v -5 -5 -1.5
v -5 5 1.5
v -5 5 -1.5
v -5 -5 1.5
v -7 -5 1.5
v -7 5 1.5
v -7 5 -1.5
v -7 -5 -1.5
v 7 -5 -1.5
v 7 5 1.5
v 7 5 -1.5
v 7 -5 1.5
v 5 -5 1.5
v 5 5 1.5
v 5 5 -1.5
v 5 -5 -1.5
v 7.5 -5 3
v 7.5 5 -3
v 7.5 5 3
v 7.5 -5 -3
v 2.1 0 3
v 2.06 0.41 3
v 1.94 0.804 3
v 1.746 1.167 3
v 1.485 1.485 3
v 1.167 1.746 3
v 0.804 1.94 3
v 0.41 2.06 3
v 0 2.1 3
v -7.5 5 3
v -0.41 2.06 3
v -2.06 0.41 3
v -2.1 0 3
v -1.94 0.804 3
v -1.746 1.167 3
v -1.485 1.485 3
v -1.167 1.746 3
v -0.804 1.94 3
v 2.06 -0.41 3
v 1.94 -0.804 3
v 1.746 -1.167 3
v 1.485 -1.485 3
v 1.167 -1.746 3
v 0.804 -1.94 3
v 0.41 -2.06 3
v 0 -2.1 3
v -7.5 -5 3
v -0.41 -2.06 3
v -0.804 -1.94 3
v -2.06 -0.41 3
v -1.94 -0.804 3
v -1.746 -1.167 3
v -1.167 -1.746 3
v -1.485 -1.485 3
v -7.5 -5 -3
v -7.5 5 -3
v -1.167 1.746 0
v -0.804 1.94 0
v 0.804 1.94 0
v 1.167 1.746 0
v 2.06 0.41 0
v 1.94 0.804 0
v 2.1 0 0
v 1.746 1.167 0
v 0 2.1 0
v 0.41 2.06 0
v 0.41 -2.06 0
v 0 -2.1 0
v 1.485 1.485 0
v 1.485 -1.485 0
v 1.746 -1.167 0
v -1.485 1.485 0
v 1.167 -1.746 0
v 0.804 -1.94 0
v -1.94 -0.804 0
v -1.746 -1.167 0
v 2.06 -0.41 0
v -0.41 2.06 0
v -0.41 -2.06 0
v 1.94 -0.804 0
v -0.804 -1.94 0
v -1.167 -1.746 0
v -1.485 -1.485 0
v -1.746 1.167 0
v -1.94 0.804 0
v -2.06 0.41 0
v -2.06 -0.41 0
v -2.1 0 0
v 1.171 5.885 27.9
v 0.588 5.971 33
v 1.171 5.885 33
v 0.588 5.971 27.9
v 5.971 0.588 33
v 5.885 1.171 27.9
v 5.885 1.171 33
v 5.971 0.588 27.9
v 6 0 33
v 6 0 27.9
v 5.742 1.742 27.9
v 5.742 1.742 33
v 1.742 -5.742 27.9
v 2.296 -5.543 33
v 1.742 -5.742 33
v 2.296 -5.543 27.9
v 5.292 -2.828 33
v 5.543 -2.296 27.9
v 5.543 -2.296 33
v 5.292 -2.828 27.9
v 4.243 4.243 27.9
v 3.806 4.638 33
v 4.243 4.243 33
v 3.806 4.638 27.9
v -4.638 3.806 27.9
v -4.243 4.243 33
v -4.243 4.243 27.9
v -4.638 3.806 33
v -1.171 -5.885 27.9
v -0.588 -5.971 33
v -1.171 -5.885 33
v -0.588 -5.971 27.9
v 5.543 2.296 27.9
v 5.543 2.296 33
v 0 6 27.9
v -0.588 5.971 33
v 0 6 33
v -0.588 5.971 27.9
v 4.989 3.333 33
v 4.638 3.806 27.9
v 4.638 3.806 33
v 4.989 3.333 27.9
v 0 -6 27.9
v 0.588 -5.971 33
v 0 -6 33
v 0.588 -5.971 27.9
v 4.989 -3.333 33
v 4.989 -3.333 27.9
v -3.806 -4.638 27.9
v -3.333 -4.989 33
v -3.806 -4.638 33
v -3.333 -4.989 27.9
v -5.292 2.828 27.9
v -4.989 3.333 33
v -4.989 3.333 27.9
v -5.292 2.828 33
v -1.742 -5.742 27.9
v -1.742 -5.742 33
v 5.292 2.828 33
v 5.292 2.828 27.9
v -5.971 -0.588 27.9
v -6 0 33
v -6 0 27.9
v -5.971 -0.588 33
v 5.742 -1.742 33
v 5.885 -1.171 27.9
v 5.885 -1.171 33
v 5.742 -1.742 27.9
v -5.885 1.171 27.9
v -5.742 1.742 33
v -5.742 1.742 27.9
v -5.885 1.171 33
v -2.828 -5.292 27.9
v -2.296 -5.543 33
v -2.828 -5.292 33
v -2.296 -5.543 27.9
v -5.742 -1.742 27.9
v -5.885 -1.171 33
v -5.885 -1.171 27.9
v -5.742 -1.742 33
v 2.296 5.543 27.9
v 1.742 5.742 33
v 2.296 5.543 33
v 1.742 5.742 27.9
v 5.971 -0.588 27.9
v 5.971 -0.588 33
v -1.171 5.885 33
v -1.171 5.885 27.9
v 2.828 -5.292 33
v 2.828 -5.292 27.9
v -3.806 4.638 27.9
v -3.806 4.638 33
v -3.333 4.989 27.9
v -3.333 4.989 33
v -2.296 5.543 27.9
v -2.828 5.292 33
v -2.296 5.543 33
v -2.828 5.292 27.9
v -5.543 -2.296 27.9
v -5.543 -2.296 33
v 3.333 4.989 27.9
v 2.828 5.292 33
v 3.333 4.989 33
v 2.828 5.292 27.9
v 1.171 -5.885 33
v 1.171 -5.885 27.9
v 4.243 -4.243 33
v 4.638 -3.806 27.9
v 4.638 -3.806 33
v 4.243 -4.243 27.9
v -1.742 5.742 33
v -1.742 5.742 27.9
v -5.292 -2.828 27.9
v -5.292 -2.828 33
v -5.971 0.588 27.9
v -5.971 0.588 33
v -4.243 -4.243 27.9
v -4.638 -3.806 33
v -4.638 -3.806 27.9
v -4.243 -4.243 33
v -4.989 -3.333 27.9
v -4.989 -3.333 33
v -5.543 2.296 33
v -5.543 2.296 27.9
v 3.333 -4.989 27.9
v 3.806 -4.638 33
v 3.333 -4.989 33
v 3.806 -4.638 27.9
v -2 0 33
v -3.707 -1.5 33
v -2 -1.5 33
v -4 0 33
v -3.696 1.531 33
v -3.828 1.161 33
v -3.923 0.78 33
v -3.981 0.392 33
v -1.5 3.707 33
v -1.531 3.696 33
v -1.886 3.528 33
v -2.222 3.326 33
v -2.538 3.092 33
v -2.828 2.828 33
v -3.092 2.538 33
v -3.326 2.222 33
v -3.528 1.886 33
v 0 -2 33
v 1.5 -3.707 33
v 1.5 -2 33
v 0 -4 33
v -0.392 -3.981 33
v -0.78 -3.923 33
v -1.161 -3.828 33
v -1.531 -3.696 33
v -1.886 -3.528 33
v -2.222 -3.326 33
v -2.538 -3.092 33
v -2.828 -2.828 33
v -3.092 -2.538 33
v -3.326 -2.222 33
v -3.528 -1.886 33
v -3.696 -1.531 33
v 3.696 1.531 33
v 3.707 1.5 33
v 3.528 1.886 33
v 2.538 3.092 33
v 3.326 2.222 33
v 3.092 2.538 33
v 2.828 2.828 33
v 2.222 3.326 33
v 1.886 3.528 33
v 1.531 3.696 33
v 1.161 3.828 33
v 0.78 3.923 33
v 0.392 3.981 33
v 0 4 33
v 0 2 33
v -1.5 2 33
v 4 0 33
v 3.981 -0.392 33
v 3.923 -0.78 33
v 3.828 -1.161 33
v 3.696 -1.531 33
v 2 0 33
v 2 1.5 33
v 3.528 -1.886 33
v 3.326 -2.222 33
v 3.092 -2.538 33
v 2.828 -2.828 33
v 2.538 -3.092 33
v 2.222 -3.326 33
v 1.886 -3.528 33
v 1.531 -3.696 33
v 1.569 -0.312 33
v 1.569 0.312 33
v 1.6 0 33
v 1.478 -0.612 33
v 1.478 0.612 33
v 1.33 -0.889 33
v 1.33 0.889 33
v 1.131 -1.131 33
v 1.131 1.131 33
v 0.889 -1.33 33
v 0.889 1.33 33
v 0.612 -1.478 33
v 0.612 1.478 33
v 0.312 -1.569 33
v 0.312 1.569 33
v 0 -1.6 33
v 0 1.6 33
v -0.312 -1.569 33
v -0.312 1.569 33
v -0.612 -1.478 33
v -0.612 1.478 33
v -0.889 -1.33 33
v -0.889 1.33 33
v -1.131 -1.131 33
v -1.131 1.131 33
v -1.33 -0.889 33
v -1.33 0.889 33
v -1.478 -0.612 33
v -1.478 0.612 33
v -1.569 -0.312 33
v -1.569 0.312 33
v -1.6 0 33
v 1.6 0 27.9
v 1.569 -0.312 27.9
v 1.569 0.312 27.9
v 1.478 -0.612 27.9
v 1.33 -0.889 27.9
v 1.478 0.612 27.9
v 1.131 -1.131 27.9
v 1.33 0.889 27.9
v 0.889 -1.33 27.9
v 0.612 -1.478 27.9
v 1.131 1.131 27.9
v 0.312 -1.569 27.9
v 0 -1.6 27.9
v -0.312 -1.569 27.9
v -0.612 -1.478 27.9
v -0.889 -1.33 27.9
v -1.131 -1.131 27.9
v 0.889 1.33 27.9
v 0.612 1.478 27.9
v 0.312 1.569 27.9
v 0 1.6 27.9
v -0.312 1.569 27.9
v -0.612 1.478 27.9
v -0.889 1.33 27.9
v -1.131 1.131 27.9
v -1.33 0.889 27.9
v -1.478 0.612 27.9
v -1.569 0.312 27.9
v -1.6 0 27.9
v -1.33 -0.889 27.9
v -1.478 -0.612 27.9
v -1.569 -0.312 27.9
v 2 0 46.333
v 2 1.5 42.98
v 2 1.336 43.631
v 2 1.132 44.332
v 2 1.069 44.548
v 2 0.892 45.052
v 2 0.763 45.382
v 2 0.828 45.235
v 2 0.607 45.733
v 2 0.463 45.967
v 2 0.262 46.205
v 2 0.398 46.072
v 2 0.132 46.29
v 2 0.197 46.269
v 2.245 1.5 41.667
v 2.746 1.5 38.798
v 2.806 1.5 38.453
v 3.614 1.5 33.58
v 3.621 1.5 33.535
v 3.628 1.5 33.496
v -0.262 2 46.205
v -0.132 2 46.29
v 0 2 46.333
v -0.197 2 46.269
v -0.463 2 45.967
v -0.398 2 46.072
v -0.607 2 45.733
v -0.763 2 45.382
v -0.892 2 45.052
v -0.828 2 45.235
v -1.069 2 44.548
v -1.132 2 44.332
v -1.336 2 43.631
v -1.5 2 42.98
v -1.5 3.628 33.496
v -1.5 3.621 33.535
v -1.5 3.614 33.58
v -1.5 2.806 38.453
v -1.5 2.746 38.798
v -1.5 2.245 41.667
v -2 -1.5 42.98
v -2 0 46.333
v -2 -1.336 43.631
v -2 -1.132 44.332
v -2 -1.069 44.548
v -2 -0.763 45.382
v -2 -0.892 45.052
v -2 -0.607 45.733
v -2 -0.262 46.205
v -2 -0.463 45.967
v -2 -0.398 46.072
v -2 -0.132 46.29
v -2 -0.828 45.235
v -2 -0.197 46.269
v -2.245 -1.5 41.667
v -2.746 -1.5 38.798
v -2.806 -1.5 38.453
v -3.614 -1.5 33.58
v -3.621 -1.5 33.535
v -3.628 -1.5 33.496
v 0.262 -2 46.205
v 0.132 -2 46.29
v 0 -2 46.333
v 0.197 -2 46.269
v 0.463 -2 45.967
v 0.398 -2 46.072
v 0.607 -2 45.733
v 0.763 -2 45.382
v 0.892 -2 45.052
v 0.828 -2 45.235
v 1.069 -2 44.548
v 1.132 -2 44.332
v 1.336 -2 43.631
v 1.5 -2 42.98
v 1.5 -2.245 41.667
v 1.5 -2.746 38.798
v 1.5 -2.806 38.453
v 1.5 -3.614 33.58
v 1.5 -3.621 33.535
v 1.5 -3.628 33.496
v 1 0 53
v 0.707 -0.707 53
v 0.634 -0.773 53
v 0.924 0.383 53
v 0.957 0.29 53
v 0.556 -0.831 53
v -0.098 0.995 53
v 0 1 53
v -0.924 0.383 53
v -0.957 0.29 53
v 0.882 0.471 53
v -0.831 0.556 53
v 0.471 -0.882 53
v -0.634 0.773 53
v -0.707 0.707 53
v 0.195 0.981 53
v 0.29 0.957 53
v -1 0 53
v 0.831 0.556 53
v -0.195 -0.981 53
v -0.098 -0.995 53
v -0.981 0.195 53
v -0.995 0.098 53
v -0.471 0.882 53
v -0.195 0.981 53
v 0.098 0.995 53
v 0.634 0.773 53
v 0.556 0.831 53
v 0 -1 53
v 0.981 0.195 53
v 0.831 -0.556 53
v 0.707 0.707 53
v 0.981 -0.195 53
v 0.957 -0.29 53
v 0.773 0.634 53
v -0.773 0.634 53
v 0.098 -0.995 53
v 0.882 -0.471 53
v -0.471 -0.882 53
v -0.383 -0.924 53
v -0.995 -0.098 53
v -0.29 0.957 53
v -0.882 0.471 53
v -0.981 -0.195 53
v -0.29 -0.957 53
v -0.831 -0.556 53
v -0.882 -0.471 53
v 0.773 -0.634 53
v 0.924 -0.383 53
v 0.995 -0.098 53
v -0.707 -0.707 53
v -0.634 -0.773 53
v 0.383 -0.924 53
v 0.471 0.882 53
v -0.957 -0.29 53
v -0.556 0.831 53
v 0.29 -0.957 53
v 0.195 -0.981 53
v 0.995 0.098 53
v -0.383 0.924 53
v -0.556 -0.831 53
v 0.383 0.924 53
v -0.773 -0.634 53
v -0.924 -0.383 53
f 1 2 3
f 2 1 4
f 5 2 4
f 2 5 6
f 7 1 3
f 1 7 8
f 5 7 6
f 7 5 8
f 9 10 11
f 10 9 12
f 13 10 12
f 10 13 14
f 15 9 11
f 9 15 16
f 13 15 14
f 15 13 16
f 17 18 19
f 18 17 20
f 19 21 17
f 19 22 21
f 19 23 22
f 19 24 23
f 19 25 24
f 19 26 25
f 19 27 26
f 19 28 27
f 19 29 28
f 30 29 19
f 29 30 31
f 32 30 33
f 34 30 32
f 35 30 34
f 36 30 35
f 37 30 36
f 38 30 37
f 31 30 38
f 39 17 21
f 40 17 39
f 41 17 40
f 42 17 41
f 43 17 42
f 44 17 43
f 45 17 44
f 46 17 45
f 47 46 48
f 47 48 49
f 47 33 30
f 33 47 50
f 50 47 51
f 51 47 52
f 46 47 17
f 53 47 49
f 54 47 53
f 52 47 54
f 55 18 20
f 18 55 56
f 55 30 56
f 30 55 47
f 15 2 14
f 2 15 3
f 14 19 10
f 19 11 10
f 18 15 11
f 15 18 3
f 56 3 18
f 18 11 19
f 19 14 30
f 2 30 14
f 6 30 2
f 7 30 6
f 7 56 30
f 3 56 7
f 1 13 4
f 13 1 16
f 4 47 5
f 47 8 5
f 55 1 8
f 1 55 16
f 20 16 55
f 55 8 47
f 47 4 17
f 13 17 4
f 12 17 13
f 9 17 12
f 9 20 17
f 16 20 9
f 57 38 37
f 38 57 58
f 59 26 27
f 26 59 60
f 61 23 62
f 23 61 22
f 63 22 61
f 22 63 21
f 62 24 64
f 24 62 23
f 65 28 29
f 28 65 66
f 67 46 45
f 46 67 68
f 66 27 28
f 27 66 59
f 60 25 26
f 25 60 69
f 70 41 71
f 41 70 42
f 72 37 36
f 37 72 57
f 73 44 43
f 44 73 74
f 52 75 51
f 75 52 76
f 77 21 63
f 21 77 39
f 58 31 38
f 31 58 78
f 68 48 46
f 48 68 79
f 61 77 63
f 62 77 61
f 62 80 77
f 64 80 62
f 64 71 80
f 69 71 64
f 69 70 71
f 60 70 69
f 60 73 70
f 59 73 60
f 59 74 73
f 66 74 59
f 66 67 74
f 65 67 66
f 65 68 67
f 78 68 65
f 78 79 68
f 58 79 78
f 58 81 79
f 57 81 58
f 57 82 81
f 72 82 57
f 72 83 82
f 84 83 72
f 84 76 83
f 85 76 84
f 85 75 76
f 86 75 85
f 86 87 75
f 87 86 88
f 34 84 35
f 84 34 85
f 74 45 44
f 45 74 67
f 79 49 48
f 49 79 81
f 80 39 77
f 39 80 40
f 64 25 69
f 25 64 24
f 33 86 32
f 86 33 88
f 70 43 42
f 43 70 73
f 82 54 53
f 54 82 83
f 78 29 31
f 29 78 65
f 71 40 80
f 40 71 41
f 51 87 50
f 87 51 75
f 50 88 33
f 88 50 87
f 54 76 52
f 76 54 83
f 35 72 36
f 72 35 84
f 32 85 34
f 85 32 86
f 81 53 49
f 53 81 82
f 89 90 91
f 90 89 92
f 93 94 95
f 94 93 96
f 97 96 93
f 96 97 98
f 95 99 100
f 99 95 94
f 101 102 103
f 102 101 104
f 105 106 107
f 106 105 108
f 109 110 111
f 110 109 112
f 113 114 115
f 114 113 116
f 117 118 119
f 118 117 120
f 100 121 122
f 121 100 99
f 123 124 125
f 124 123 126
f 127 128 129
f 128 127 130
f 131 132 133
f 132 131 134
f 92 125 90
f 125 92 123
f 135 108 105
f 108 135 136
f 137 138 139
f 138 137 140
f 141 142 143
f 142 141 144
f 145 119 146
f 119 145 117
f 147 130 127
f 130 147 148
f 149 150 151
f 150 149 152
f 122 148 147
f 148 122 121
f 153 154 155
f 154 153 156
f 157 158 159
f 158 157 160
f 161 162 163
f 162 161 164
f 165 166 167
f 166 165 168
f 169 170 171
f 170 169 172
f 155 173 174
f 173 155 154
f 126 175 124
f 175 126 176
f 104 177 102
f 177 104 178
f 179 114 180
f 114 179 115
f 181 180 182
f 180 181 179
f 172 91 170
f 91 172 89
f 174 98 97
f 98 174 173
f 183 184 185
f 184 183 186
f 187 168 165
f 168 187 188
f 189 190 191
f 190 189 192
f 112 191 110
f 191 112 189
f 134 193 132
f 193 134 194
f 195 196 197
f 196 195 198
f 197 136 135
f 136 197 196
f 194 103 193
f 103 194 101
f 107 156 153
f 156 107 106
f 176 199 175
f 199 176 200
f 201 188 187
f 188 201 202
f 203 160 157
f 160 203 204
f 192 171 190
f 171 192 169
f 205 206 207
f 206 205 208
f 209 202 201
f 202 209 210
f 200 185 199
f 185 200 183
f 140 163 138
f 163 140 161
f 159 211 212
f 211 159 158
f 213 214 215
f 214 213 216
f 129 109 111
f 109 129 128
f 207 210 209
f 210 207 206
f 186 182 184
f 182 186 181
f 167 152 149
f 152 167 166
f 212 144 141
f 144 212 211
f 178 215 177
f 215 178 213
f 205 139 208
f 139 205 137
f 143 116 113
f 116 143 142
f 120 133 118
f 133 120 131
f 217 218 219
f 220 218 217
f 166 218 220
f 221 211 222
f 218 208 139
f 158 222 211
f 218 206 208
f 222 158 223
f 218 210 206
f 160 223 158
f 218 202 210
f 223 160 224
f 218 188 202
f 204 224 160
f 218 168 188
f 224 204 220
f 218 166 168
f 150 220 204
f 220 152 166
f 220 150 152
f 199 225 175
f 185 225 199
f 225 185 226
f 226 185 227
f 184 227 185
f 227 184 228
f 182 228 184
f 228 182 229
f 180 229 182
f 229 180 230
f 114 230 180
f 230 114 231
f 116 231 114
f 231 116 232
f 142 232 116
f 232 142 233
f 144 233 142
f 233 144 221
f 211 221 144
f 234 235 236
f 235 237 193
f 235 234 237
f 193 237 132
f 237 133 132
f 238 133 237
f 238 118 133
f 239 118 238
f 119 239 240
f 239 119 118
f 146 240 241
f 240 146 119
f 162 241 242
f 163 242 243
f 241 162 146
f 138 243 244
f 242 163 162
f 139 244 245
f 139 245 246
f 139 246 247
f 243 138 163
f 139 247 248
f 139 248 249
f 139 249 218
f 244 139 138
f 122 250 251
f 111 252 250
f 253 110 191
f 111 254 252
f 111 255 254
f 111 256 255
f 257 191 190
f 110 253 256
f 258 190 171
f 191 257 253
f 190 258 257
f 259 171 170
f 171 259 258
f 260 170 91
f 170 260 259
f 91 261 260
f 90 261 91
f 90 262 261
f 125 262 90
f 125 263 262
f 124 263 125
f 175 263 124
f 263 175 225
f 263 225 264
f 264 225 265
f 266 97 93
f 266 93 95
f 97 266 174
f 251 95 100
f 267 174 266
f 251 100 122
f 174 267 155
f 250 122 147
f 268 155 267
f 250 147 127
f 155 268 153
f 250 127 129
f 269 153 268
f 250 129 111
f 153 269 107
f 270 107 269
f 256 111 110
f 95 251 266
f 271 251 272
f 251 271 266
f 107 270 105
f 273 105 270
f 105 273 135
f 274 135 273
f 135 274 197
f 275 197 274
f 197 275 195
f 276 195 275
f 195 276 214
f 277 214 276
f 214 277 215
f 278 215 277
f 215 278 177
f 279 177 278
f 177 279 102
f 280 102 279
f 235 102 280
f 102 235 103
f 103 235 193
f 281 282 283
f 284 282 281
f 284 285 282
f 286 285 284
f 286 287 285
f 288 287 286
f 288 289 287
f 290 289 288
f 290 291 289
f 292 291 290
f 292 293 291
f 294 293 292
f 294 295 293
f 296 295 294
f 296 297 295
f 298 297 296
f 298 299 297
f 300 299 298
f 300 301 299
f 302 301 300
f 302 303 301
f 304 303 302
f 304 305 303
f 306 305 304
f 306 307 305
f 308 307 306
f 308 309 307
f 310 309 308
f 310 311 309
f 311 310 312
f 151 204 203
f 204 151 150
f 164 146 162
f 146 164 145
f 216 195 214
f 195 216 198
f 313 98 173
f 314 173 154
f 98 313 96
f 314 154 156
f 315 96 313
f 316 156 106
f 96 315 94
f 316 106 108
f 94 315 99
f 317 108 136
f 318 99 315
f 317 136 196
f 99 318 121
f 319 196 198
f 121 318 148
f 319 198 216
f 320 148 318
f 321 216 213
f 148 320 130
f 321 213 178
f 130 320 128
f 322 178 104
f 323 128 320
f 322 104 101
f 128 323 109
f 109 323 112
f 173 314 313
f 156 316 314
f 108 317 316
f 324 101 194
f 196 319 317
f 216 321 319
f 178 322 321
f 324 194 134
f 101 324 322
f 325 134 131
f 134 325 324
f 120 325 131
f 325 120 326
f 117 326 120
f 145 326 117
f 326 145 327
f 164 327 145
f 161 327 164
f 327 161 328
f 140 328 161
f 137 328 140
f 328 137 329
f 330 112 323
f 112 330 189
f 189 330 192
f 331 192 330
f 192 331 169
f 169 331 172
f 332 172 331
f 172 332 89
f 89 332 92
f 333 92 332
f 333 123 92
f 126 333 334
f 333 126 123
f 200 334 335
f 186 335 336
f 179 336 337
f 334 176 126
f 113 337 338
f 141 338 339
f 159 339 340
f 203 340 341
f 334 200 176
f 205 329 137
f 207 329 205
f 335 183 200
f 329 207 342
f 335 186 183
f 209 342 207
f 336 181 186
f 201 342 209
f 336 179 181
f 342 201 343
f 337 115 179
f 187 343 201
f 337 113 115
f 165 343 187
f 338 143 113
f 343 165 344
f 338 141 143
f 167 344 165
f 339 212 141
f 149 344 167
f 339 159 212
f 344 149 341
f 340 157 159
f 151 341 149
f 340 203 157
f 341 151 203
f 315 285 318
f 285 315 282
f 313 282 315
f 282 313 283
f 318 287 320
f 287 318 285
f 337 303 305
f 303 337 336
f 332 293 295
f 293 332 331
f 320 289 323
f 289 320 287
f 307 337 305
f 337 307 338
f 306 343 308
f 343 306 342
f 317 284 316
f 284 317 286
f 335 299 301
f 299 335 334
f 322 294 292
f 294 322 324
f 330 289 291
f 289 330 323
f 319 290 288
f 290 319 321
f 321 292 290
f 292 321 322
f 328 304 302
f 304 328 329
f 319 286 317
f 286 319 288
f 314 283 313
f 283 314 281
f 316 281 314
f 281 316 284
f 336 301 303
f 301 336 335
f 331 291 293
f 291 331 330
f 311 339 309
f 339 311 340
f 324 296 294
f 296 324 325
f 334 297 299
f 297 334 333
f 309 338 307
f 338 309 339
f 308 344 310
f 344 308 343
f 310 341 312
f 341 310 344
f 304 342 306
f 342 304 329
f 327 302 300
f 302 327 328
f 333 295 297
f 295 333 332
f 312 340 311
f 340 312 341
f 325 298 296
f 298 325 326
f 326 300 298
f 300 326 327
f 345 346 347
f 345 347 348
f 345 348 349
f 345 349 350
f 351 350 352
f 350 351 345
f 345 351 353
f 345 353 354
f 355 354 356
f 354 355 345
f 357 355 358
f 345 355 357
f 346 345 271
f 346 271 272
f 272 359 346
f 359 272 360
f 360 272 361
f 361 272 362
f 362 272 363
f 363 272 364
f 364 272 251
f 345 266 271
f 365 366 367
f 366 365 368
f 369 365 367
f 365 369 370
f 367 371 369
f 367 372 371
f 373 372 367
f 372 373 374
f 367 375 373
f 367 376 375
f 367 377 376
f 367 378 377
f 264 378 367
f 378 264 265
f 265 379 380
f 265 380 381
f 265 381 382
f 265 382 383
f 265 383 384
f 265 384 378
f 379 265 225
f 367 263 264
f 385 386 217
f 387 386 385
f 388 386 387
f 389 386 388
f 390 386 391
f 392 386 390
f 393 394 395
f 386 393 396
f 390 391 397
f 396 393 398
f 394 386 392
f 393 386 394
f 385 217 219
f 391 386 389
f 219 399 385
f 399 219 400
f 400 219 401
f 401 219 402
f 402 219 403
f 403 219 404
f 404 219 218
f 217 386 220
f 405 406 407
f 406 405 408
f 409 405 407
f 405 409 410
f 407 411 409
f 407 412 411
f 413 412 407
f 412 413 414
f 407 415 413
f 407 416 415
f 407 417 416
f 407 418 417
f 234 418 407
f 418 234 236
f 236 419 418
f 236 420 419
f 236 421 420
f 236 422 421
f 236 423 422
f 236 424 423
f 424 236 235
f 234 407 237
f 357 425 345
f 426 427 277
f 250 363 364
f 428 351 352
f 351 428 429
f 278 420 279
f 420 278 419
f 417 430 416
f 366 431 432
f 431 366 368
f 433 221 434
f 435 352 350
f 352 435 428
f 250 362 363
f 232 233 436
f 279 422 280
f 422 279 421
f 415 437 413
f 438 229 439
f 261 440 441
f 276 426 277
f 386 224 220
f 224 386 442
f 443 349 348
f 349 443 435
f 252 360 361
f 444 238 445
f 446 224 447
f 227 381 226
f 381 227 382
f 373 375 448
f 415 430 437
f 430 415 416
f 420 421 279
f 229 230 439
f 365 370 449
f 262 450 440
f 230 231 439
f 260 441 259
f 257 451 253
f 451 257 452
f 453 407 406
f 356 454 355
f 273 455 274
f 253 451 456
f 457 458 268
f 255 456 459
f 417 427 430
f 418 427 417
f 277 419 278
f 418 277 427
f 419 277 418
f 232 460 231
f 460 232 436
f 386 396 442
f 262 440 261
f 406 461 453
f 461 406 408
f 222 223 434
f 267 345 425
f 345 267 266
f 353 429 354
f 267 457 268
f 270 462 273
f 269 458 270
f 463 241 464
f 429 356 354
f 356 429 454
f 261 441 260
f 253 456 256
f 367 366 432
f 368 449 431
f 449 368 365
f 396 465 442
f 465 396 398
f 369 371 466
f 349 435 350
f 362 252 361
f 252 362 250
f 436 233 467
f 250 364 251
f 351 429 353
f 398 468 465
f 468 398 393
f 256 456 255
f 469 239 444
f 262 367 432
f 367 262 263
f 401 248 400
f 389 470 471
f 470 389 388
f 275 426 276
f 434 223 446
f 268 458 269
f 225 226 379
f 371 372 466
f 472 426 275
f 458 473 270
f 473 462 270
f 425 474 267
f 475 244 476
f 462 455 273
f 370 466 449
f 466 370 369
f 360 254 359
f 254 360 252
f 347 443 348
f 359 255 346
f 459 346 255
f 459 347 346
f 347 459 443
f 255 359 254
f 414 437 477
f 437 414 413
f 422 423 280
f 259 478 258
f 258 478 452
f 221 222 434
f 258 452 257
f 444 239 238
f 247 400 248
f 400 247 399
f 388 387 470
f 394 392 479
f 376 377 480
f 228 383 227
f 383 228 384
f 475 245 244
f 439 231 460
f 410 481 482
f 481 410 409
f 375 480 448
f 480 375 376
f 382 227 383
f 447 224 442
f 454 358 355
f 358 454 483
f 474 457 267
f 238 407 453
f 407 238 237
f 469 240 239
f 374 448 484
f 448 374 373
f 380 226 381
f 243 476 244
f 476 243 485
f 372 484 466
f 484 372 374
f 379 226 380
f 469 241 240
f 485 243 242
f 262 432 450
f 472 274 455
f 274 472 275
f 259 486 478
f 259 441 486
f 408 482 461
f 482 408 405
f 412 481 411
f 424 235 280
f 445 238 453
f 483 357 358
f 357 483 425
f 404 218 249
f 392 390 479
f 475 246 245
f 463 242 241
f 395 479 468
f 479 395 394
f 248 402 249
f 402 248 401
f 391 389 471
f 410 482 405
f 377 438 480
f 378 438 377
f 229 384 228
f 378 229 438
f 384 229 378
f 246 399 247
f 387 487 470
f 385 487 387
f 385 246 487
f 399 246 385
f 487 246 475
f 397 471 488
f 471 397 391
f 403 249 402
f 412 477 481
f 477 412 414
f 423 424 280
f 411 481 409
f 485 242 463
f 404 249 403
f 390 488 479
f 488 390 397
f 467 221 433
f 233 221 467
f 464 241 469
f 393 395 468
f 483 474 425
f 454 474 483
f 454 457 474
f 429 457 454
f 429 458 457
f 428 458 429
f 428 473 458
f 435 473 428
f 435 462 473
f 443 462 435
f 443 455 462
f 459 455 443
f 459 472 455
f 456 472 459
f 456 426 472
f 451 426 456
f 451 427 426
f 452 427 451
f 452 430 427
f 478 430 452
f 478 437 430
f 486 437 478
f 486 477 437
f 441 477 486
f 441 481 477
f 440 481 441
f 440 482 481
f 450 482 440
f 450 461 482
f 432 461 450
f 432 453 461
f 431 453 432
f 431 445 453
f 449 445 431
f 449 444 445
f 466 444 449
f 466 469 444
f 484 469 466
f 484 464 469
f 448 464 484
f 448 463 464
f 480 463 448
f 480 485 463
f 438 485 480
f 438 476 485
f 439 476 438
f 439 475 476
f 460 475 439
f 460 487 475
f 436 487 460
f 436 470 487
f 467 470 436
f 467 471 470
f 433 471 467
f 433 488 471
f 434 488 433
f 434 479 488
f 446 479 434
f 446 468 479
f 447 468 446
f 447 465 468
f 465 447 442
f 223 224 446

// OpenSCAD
// AstraAnt Tool: Rotary Drill Head
// Print in PETG. Motor (N20) press-fits into body cavity.
// Bit is replaceable (insert from front).
//
// Print orientation: mount face on build plate (standing up)
// Supports: none needed
// Tolerance: 0.2mm for press-fit pockets

$fn = 64;


// Universal magnetic mount interface
// Clips between ant mandibles, held by neodymium magnets
module magnetic_mount(width=15, depth=10, magnet_d=4) {
    difference() {
        // Mount body
        cube([width, depth, 6], center=true);
        // Magnet pocket (recessed)
        translate([0, 0, 1.5])
            cylinder(d=4+0.2, h=3, center=true, $fn=32);
        // Mandible grip grooves (two channels for ant mandibles)
        for (side = [-1, 1]) {
            translate([side * (width/2 - 1.5), 0, 0])
                cube([2, depth+1, 3], center=true);
        }
    }
}


// Parameters (edit these to customize)
body_diameter = 12;
body_length = 30;
bit_diameter = 8;
bit_length = 20;
motor_pocket_d = 12.2;   // N20 motor diameter + clearance
motor_pocket_depth = 25;
flute_count = 4;
flute_depth = 1.5;

module drill_body() {
    difference() {
        // Cylindrical body
        cylinder(d=body_diameter, h=body_length);
        // Motor pocket (hollowed from rear)
        translate([0, 0, -0.1])
            cylinder(d=motor_pocket_d, h=motor_pocket_depth);
        // Shaft hole through the front
        translate([0, 0, motor_pocket_depth - 1])
            cylinder(d=3.2, h=body_length, $fn=32);  // 3mm motor shaft + clearance
    }
}

module drill_bit() {
    // Conical fluted bit (decorative — real bit is tungsten carbide insert)
    difference() {
        cylinder(d1=bit_diameter, d2=2, h=bit_length);
        // Flutes (spiral approximated as straight channels)
        for (i = [0:flute_count-1]) {
            rotate([0, 0, i * 360/flute_count])
                translate([bit_diameter/4, 0, -1])
                    cube([bit_diameter, flute_depth, bit_length+2]);
        }
    }
}

// Assembly
module drill_head_assembly() {
    // Mount interface at bottom
    magnetic_mount();
    // Body
    translate([0, 0, 3])
        drill_body();
    // Bit
    translate([0, 0, 3 + body_length])
        drill_bit();
}

drill_head_assembly();
